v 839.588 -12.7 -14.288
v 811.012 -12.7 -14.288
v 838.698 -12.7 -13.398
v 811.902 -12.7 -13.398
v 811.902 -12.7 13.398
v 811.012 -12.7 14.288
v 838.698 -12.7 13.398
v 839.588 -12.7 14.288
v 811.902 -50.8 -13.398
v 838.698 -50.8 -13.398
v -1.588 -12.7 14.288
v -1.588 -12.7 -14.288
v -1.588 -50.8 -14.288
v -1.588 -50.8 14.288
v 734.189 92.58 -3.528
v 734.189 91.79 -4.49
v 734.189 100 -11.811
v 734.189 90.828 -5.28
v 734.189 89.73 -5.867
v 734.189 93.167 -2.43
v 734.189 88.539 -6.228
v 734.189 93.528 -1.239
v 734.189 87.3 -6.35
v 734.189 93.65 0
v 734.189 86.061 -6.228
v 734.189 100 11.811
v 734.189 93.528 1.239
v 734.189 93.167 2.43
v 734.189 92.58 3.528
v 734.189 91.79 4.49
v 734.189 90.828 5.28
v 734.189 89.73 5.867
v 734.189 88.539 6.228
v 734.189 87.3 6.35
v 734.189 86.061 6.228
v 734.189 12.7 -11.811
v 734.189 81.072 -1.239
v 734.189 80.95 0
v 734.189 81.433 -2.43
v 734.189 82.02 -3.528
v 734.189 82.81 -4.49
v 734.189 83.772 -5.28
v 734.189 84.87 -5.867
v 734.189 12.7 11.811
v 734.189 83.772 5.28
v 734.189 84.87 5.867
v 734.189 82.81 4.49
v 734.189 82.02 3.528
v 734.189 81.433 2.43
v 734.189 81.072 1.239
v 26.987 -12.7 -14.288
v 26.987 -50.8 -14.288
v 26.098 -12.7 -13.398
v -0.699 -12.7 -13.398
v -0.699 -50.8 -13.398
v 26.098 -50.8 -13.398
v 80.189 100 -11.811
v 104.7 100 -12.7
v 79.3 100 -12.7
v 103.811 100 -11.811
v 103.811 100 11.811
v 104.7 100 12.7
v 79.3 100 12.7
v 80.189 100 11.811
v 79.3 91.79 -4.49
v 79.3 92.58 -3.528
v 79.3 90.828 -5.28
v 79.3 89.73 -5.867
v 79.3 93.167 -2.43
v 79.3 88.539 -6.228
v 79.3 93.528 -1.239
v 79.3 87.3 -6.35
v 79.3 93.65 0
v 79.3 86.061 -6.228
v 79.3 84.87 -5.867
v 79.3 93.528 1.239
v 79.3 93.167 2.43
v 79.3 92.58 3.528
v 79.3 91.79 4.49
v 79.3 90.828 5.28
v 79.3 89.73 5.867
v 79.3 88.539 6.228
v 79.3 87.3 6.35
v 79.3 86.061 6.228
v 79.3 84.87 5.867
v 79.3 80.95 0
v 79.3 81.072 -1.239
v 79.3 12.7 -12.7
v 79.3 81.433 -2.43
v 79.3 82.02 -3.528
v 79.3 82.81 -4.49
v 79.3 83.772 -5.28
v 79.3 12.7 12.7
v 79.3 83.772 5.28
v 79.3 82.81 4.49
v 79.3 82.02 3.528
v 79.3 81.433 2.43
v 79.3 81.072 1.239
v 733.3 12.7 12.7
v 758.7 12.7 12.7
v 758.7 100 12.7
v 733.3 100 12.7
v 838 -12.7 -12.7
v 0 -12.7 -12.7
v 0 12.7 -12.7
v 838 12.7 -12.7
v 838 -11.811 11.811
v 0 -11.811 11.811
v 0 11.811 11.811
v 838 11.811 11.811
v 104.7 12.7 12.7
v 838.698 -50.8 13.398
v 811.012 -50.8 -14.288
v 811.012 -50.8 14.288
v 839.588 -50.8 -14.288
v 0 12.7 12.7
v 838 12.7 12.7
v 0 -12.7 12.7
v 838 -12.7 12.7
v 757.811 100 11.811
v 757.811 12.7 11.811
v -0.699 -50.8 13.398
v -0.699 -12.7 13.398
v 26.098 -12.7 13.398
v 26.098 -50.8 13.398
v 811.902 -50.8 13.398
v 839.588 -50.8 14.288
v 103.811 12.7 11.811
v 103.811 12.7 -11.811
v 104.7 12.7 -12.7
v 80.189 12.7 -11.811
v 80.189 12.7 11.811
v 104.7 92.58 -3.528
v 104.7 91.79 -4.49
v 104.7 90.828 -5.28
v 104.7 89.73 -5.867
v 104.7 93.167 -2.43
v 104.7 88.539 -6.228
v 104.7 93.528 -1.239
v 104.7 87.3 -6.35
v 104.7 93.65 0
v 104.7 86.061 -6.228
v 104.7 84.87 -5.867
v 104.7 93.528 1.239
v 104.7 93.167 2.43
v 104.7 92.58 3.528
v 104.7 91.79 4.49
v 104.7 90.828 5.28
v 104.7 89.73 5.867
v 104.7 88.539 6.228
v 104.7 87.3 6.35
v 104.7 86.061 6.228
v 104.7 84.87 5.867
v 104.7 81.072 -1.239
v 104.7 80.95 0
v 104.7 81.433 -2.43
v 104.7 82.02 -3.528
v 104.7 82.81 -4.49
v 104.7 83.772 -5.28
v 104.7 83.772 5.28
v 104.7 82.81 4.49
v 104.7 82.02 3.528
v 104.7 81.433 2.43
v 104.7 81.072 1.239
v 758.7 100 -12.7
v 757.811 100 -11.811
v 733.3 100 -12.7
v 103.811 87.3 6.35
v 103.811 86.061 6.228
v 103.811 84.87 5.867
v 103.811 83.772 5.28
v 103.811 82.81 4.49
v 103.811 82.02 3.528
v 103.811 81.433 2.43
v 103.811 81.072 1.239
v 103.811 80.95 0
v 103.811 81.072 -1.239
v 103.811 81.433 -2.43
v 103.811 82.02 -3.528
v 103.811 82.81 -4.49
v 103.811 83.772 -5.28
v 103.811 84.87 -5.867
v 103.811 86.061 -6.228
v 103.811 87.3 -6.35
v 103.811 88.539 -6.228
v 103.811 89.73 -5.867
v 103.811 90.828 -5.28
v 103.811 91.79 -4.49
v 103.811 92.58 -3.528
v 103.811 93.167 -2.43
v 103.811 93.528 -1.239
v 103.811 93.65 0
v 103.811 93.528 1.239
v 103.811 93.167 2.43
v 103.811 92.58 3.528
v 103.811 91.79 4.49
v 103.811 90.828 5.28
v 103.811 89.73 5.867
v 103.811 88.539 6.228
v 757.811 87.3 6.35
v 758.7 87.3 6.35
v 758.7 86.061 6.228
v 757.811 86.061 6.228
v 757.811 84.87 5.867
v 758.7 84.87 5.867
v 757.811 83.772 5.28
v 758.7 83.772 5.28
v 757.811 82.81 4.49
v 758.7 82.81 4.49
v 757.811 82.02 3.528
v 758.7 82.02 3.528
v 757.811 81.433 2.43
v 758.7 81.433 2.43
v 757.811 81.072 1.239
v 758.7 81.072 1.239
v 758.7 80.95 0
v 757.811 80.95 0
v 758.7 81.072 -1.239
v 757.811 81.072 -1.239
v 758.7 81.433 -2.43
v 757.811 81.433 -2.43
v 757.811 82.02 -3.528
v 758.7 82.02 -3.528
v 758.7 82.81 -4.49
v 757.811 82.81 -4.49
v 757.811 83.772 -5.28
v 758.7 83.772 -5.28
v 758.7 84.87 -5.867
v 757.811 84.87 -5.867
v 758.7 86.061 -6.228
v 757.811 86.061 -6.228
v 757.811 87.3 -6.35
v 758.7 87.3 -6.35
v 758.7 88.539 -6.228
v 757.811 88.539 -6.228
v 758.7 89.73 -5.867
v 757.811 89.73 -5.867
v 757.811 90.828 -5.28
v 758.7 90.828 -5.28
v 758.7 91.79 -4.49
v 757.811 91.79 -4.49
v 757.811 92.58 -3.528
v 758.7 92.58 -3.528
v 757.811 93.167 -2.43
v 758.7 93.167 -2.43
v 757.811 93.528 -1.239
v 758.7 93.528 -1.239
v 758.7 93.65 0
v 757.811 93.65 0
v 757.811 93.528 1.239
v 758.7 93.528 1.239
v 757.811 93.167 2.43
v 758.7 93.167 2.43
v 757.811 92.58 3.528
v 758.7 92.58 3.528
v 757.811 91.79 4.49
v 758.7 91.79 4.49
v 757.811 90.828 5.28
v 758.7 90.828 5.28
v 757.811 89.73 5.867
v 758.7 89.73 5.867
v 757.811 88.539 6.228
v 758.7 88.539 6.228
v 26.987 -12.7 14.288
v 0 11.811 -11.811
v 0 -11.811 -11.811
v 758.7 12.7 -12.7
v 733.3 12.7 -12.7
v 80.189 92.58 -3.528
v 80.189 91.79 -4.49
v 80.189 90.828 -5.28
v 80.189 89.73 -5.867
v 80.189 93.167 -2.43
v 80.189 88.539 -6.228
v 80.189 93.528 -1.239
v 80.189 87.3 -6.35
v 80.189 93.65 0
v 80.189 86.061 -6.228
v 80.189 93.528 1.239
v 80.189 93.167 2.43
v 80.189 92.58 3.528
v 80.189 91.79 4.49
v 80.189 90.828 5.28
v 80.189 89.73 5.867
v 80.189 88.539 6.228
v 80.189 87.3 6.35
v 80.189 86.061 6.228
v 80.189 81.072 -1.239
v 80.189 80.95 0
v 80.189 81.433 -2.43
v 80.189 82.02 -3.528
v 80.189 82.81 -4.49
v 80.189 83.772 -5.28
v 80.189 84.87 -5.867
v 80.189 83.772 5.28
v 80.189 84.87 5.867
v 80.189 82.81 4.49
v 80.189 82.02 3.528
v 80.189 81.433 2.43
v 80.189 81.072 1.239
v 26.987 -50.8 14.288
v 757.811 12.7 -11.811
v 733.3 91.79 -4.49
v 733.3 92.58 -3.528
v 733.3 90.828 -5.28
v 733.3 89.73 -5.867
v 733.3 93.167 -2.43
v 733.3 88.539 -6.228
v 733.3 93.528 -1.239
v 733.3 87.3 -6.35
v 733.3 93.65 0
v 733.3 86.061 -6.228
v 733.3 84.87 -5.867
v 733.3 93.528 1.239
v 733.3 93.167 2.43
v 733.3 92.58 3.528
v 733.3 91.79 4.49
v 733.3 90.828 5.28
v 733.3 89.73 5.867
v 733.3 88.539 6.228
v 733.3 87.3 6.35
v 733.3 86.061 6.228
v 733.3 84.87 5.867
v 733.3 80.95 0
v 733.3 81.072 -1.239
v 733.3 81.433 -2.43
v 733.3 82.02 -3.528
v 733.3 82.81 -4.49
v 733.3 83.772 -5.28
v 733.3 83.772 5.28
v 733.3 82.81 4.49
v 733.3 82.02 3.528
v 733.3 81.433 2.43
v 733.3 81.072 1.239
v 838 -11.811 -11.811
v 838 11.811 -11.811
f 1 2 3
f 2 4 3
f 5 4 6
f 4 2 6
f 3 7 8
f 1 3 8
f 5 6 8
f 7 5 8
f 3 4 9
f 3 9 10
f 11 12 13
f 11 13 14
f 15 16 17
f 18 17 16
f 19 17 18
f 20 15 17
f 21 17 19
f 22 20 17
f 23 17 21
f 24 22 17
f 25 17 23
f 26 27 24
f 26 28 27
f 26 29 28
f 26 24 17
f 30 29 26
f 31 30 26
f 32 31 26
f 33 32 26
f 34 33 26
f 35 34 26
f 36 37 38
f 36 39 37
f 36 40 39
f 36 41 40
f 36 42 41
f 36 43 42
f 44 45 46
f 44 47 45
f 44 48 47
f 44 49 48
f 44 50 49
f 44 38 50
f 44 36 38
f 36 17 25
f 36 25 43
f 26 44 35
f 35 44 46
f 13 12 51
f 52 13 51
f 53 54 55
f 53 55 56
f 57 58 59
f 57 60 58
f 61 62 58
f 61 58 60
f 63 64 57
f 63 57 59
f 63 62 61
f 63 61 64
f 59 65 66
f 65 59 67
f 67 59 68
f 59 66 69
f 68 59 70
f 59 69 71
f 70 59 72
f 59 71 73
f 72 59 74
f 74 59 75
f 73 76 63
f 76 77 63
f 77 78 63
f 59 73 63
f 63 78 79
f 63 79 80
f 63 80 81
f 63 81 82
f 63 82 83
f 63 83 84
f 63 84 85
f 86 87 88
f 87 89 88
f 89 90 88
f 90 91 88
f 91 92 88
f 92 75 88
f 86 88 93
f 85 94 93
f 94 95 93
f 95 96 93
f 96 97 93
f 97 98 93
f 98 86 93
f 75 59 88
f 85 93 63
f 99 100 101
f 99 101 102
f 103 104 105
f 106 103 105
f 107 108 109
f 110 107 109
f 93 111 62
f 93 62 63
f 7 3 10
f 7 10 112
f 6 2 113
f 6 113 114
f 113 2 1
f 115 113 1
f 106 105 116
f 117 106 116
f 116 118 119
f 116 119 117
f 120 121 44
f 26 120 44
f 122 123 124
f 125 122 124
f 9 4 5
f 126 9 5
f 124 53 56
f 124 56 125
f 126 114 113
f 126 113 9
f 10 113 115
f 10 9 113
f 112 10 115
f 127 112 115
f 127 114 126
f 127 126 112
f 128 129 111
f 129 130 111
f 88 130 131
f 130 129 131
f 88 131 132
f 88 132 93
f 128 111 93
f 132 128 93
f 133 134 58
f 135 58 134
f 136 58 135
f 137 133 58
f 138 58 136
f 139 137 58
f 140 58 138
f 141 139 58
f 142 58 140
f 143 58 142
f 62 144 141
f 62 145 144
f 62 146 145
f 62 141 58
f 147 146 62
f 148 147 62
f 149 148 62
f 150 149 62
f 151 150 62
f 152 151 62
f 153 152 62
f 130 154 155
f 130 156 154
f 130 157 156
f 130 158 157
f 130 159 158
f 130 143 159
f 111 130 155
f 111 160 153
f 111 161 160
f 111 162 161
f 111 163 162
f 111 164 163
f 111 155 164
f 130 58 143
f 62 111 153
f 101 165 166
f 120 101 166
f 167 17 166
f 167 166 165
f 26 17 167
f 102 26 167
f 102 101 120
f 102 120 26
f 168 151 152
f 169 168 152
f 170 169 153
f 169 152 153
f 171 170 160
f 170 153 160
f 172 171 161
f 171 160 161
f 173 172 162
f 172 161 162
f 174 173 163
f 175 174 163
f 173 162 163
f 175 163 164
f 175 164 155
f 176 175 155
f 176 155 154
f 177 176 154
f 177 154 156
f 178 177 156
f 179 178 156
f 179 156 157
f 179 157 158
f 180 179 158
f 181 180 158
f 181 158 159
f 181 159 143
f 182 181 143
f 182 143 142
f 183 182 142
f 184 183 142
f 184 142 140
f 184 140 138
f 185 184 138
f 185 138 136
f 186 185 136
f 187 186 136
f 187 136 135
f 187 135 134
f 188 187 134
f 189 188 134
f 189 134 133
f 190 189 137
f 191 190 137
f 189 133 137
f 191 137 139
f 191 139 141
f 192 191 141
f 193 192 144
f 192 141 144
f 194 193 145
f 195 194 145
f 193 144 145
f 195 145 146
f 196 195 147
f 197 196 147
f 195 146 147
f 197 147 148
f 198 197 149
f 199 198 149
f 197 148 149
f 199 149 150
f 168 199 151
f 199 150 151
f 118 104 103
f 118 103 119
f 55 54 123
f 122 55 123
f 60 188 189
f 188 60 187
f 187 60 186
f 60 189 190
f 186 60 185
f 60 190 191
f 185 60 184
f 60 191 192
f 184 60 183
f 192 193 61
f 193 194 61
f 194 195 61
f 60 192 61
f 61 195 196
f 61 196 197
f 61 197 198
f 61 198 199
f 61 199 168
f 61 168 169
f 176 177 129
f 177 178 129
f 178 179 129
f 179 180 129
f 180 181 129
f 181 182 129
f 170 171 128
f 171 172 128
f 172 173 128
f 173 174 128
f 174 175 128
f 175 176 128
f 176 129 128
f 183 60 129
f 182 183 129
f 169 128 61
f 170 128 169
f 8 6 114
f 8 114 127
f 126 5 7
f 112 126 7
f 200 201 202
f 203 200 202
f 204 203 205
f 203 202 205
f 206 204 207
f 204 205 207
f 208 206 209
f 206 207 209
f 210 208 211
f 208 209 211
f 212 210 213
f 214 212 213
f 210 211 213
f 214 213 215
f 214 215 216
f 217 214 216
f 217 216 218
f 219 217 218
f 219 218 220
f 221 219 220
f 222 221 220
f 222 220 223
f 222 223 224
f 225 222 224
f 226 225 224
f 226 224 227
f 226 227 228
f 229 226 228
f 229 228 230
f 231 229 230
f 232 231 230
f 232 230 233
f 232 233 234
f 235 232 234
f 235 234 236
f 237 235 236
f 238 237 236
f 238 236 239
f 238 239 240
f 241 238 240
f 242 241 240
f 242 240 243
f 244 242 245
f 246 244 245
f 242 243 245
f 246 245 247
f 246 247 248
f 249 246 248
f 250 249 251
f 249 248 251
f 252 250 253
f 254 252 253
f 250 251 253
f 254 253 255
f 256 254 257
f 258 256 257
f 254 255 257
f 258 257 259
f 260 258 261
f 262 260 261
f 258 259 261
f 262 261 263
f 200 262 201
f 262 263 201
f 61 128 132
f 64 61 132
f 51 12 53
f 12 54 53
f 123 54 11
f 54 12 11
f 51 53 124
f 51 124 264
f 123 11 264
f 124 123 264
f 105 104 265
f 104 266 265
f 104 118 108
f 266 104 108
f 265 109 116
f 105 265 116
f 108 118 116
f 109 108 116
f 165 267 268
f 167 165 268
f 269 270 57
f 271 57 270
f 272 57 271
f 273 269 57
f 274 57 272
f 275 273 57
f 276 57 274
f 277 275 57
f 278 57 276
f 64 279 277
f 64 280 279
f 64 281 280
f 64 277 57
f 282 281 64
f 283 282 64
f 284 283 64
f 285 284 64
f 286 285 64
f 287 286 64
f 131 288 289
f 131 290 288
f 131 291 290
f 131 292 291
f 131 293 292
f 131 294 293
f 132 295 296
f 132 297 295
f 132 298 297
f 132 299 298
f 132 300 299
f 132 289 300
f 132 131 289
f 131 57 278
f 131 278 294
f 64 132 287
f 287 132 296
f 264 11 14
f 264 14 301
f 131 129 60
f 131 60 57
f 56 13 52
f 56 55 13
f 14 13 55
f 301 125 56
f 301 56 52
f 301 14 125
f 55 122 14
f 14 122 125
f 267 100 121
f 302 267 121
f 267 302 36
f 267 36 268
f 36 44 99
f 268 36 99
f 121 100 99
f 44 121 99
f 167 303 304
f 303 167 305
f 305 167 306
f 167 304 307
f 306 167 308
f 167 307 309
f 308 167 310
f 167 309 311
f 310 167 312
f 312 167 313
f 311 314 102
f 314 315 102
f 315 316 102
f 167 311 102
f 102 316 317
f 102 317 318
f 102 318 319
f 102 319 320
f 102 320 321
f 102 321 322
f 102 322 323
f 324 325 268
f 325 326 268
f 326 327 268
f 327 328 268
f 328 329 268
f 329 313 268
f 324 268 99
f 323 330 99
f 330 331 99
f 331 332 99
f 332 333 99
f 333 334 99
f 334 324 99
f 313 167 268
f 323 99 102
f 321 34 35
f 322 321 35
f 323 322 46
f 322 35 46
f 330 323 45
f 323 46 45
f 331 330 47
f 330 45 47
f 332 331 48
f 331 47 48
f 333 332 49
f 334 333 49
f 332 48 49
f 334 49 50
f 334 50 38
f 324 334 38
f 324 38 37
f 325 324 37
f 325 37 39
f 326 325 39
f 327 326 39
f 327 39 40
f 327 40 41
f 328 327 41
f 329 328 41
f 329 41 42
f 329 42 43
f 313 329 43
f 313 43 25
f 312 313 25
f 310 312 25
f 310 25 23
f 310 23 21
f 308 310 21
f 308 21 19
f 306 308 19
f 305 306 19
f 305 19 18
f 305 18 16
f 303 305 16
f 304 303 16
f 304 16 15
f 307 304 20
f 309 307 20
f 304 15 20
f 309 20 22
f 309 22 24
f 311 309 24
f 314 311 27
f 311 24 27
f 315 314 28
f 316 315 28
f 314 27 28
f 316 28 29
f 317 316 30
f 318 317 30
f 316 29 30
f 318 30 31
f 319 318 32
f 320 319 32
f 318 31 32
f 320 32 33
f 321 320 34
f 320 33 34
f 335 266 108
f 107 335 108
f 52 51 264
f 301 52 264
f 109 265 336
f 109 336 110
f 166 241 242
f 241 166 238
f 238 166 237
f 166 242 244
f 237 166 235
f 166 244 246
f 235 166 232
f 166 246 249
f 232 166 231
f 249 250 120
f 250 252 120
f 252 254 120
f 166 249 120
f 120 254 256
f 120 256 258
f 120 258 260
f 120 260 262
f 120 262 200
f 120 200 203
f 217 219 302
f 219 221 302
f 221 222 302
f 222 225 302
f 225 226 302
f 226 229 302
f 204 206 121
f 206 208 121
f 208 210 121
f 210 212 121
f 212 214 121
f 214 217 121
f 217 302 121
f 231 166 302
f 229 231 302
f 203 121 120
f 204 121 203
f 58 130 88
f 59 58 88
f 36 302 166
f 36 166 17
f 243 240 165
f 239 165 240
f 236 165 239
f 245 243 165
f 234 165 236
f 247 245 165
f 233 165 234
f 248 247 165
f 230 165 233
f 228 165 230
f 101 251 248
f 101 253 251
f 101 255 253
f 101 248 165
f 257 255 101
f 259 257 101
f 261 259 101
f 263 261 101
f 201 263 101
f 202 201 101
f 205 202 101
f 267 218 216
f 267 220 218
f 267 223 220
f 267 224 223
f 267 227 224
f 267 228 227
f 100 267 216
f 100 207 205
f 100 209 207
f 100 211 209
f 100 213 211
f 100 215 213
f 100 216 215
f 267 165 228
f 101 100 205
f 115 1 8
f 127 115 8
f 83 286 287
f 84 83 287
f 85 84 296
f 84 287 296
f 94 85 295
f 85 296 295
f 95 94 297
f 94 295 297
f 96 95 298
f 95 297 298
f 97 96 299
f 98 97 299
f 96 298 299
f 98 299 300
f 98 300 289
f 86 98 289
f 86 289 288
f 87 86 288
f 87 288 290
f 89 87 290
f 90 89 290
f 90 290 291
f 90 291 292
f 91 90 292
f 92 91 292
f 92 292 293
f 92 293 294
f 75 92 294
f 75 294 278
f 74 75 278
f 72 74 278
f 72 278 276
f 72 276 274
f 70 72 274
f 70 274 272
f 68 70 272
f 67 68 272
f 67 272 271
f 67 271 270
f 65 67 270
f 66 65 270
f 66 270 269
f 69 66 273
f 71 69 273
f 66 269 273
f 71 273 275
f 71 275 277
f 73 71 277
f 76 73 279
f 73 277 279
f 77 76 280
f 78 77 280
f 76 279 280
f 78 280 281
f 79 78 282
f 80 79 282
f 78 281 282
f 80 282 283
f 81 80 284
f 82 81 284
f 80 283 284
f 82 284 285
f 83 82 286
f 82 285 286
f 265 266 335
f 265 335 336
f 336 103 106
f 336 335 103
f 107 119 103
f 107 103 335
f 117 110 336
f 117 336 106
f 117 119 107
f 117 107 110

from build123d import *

# Parameters (mm, degrees)
SKETCH15_W                                 = 25.4
SKETCH15_H                                 = 25.4
SKETCH15_W_2                               = 23.622
SKETCH15_H_2                               = 23.622
AL_TUBE_SQUARE_1_SQ_X_035_WALL_1_DEPTH     = 838
SKETCH15_ON_SEGMENT_2_W                    = 25.4
SKETCH15_ON_SEGMENT_2_H                    = 25.4
SKETCH15_ON_SEGMENT_2_W_2                  = 23.622
SKETCH15_ON_SEGMENT_2_H_2                  = 23.622
AL_TUBE_SQUARE_1_SQ_X_035_WALL_1_2_DEPTH   = 101
SKETCH15_ON_SEGMENT_3_W                    = 25.4
SKETCH15_ON_SEGMENT_3_H                    = 25.4
SKETCH15_ON_SEGMENT_3_W_2                  = 23.622
SKETCH15_ON_SEGMENT_3_H_2                  = 23.622
AL_TUBE_SQUARE_1_SQ_X_035_WALL_1_3_DEPTH   = 101
SKETCH16_W                                 = 28.575
SKETCH16_H                                 = 28.575
SKETCH16_W_2                               = 26.797
SKETCH16_H_2                               = 26.797
AL_TUBE_SQUARE_1_125_SQ_X_035_WALL_2_DEPTH = 50.8
SKETCH16_ON_SEGMENT_2_W                    = 28.575
SKETCH16_ON_SEGMENT_2_H                    = 28.575
SKETCH16_ON_SEGMENT_2_W_2                  = 26.797
SKETCH16_ON_SEGMENT_2_H_2                  = 26.797
AL_TUBE_SQUARE_1_125_SQ_X_035_WAL_2_DEPTH  = 50.8
CROQUIS11_R                                = 6.35
CORTAR_EXTRUIR1_DEPTH                      = 768.858


with BuildPart() as part:
    # Sketch15 → Al tube (square) 1 SQ X .035 WALL(1) (new body)
    with BuildSketch(Plane.YZ):
        Rectangle(SKETCH15_W, SKETCH15_H)
        Rectangle(SKETCH15_W_2, SKETCH15_H_2, mode=Mode.SUBTRACT)
    extrude(amount=AL_TUBE_SQUARE_1_SQ_X_035_WALL_1_DEPTH)


with BuildPart() as body_2:
    # Sketch15 on segment 2 (carried to segment 2) → Al tube _square_ 1 SQ X .035 WALL_1 2 (new body)
    with BuildSketch(Plane(origin=(92, -1, 0), x_dir=(-1, 0, 0), z_dir=(0, 1, 0))):
        Rectangle(SKETCH15_ON_SEGMENT_2_W, SKETCH15_ON_SEGMENT_2_H)
        Rectangle(SKETCH15_ON_SEGMENT_2_W_2, SKETCH15_ON_SEGMENT_2_H_2, mode=Mode.SUBTRACT)
    extrude(amount=AL_TUBE_SQUARE_1_SQ_X_035_WALL_1_2_DEPTH)

    # Al tube _square_ 1 SQ X .035 WALL_1 2 en
    split(bisect_by=Plane(origin=(92, 12.7, 0), x_dir=(-1, 0, 0), z_dir=(0, 1, 0)), keep=Keep.TOP)


with BuildPart() as body_3:
    # Sketch15 on segment 3 (carried to segment 3) → Al tube _square_ 1 SQ X .035 WALL_1 3 (new body)
    with BuildSketch(Plane(origin=(746, -1, 0), x_dir=(-1, 0, 0), z_dir=(0, 1, 0))):
        Rectangle(SKETCH15_ON_SEGMENT_3_W, SKETCH15_ON_SEGMENT_3_H)
        Rectangle(SKETCH15_ON_SEGMENT_3_W_2, SKETCH15_ON_SEGMENT_3_H_2, mode=Mode.SUBTRACT)
    extrude(amount=AL_TUBE_SQUARE_1_SQ_X_035_WALL_1_3_DEPTH)

    # Al tube _square_ 1 SQ X .035 WALL_1 3 en
    split(bisect_by=Plane(origin=(746, 12.7, 0), x_dir=(-1, 0, 0), z_dir=(0, 1, 0)), keep=Keep.TOP)


with BuildPart() as body_4:
    # Sketch16 → Al tube (square) 1.125 SQ X .035 WALL(2) (new body)
    with BuildSketch(Plane(origin=(12.7, 0, 0), x_dir=(1, 0, 0), z_dir=(0, -1, 0))):
        Rectangle(SKETCH16_W, SKETCH16_H)
        Rectangle(SKETCH16_W_2, SKETCH16_H_2, mode=Mode.SUBTRACT)
    extrude(amount=AL_TUBE_SQUARE_1_125_SQ_X_035_WALL_2_DEPTH)

    # Recortar/Extender1
    split(bisect_by=Plane(origin=(419, -12.7, 0), x_dir=(1, 0, 0), z_dir=(0, -1, 0)), keep=Keep.TOP)


with BuildPart() as body_5:
    # Sketch16 on segment 2 (carried to segment 2) → Al tube _square_ 1.125 SQ X .035 WAL 2 (new body)
    with BuildSketch(Plane(origin=(825.3, 0, 0), x_dir=(1, 0, 0), z_dir=(0, -1, 0))):
        Rectangle(SKETCH16_ON_SEGMENT_2_W, SKETCH16_ON_SEGMENT_2_H)
        Rectangle(SKETCH16_ON_SEGMENT_2_W_2, SKETCH16_ON_SEGMENT_2_H_2, mode=Mode.SUBTRACT)
    extrude(amount=AL_TUBE_SQUARE_1_125_SQ_X_035_WAL_2_DEPTH)

    # Recortar/Extender1
    split(bisect_by=Plane(origin=(419, -12.7, 0), x_dir=(1, 0, 0), z_dir=(0, -1, 0)), keep=Keep.TOP)


with BuildPart() as cortar_extruir1_tool:
    # Croquis11 → Cortar-Extruir1 (new body)
    with BuildSketch(Plane(origin=(758.7, 0, 0), x_dir=(0, 0, -1), z_dir=(1, 0, 0))):
        with Locations(Location((0, 87.3, 0), (0, 0, 180))):
            Circle(CROQUIS11_R)
    extrude(amount=-CORTAR_EXTRUIR1_DEPTH)


with BuildPart() as body_2_1:
    add(body_2.part)

    # Cortar-Extruir1: cut by cortar_extruir1_tool
    add(cortar_extruir1_tool.part, mode=Mode.SUBTRACT)


with BuildPart() as body_3_1:
    add(body_3.part)

    # Cortar-Extruir1: cut by cortar_extruir1_tool
    add(cortar_extruir1_tool.part, mode=Mode.SUBTRACT)


solid = Compound([part.part, body_4.part, body_5.part, body_2_1.part, body_3_1.part])
